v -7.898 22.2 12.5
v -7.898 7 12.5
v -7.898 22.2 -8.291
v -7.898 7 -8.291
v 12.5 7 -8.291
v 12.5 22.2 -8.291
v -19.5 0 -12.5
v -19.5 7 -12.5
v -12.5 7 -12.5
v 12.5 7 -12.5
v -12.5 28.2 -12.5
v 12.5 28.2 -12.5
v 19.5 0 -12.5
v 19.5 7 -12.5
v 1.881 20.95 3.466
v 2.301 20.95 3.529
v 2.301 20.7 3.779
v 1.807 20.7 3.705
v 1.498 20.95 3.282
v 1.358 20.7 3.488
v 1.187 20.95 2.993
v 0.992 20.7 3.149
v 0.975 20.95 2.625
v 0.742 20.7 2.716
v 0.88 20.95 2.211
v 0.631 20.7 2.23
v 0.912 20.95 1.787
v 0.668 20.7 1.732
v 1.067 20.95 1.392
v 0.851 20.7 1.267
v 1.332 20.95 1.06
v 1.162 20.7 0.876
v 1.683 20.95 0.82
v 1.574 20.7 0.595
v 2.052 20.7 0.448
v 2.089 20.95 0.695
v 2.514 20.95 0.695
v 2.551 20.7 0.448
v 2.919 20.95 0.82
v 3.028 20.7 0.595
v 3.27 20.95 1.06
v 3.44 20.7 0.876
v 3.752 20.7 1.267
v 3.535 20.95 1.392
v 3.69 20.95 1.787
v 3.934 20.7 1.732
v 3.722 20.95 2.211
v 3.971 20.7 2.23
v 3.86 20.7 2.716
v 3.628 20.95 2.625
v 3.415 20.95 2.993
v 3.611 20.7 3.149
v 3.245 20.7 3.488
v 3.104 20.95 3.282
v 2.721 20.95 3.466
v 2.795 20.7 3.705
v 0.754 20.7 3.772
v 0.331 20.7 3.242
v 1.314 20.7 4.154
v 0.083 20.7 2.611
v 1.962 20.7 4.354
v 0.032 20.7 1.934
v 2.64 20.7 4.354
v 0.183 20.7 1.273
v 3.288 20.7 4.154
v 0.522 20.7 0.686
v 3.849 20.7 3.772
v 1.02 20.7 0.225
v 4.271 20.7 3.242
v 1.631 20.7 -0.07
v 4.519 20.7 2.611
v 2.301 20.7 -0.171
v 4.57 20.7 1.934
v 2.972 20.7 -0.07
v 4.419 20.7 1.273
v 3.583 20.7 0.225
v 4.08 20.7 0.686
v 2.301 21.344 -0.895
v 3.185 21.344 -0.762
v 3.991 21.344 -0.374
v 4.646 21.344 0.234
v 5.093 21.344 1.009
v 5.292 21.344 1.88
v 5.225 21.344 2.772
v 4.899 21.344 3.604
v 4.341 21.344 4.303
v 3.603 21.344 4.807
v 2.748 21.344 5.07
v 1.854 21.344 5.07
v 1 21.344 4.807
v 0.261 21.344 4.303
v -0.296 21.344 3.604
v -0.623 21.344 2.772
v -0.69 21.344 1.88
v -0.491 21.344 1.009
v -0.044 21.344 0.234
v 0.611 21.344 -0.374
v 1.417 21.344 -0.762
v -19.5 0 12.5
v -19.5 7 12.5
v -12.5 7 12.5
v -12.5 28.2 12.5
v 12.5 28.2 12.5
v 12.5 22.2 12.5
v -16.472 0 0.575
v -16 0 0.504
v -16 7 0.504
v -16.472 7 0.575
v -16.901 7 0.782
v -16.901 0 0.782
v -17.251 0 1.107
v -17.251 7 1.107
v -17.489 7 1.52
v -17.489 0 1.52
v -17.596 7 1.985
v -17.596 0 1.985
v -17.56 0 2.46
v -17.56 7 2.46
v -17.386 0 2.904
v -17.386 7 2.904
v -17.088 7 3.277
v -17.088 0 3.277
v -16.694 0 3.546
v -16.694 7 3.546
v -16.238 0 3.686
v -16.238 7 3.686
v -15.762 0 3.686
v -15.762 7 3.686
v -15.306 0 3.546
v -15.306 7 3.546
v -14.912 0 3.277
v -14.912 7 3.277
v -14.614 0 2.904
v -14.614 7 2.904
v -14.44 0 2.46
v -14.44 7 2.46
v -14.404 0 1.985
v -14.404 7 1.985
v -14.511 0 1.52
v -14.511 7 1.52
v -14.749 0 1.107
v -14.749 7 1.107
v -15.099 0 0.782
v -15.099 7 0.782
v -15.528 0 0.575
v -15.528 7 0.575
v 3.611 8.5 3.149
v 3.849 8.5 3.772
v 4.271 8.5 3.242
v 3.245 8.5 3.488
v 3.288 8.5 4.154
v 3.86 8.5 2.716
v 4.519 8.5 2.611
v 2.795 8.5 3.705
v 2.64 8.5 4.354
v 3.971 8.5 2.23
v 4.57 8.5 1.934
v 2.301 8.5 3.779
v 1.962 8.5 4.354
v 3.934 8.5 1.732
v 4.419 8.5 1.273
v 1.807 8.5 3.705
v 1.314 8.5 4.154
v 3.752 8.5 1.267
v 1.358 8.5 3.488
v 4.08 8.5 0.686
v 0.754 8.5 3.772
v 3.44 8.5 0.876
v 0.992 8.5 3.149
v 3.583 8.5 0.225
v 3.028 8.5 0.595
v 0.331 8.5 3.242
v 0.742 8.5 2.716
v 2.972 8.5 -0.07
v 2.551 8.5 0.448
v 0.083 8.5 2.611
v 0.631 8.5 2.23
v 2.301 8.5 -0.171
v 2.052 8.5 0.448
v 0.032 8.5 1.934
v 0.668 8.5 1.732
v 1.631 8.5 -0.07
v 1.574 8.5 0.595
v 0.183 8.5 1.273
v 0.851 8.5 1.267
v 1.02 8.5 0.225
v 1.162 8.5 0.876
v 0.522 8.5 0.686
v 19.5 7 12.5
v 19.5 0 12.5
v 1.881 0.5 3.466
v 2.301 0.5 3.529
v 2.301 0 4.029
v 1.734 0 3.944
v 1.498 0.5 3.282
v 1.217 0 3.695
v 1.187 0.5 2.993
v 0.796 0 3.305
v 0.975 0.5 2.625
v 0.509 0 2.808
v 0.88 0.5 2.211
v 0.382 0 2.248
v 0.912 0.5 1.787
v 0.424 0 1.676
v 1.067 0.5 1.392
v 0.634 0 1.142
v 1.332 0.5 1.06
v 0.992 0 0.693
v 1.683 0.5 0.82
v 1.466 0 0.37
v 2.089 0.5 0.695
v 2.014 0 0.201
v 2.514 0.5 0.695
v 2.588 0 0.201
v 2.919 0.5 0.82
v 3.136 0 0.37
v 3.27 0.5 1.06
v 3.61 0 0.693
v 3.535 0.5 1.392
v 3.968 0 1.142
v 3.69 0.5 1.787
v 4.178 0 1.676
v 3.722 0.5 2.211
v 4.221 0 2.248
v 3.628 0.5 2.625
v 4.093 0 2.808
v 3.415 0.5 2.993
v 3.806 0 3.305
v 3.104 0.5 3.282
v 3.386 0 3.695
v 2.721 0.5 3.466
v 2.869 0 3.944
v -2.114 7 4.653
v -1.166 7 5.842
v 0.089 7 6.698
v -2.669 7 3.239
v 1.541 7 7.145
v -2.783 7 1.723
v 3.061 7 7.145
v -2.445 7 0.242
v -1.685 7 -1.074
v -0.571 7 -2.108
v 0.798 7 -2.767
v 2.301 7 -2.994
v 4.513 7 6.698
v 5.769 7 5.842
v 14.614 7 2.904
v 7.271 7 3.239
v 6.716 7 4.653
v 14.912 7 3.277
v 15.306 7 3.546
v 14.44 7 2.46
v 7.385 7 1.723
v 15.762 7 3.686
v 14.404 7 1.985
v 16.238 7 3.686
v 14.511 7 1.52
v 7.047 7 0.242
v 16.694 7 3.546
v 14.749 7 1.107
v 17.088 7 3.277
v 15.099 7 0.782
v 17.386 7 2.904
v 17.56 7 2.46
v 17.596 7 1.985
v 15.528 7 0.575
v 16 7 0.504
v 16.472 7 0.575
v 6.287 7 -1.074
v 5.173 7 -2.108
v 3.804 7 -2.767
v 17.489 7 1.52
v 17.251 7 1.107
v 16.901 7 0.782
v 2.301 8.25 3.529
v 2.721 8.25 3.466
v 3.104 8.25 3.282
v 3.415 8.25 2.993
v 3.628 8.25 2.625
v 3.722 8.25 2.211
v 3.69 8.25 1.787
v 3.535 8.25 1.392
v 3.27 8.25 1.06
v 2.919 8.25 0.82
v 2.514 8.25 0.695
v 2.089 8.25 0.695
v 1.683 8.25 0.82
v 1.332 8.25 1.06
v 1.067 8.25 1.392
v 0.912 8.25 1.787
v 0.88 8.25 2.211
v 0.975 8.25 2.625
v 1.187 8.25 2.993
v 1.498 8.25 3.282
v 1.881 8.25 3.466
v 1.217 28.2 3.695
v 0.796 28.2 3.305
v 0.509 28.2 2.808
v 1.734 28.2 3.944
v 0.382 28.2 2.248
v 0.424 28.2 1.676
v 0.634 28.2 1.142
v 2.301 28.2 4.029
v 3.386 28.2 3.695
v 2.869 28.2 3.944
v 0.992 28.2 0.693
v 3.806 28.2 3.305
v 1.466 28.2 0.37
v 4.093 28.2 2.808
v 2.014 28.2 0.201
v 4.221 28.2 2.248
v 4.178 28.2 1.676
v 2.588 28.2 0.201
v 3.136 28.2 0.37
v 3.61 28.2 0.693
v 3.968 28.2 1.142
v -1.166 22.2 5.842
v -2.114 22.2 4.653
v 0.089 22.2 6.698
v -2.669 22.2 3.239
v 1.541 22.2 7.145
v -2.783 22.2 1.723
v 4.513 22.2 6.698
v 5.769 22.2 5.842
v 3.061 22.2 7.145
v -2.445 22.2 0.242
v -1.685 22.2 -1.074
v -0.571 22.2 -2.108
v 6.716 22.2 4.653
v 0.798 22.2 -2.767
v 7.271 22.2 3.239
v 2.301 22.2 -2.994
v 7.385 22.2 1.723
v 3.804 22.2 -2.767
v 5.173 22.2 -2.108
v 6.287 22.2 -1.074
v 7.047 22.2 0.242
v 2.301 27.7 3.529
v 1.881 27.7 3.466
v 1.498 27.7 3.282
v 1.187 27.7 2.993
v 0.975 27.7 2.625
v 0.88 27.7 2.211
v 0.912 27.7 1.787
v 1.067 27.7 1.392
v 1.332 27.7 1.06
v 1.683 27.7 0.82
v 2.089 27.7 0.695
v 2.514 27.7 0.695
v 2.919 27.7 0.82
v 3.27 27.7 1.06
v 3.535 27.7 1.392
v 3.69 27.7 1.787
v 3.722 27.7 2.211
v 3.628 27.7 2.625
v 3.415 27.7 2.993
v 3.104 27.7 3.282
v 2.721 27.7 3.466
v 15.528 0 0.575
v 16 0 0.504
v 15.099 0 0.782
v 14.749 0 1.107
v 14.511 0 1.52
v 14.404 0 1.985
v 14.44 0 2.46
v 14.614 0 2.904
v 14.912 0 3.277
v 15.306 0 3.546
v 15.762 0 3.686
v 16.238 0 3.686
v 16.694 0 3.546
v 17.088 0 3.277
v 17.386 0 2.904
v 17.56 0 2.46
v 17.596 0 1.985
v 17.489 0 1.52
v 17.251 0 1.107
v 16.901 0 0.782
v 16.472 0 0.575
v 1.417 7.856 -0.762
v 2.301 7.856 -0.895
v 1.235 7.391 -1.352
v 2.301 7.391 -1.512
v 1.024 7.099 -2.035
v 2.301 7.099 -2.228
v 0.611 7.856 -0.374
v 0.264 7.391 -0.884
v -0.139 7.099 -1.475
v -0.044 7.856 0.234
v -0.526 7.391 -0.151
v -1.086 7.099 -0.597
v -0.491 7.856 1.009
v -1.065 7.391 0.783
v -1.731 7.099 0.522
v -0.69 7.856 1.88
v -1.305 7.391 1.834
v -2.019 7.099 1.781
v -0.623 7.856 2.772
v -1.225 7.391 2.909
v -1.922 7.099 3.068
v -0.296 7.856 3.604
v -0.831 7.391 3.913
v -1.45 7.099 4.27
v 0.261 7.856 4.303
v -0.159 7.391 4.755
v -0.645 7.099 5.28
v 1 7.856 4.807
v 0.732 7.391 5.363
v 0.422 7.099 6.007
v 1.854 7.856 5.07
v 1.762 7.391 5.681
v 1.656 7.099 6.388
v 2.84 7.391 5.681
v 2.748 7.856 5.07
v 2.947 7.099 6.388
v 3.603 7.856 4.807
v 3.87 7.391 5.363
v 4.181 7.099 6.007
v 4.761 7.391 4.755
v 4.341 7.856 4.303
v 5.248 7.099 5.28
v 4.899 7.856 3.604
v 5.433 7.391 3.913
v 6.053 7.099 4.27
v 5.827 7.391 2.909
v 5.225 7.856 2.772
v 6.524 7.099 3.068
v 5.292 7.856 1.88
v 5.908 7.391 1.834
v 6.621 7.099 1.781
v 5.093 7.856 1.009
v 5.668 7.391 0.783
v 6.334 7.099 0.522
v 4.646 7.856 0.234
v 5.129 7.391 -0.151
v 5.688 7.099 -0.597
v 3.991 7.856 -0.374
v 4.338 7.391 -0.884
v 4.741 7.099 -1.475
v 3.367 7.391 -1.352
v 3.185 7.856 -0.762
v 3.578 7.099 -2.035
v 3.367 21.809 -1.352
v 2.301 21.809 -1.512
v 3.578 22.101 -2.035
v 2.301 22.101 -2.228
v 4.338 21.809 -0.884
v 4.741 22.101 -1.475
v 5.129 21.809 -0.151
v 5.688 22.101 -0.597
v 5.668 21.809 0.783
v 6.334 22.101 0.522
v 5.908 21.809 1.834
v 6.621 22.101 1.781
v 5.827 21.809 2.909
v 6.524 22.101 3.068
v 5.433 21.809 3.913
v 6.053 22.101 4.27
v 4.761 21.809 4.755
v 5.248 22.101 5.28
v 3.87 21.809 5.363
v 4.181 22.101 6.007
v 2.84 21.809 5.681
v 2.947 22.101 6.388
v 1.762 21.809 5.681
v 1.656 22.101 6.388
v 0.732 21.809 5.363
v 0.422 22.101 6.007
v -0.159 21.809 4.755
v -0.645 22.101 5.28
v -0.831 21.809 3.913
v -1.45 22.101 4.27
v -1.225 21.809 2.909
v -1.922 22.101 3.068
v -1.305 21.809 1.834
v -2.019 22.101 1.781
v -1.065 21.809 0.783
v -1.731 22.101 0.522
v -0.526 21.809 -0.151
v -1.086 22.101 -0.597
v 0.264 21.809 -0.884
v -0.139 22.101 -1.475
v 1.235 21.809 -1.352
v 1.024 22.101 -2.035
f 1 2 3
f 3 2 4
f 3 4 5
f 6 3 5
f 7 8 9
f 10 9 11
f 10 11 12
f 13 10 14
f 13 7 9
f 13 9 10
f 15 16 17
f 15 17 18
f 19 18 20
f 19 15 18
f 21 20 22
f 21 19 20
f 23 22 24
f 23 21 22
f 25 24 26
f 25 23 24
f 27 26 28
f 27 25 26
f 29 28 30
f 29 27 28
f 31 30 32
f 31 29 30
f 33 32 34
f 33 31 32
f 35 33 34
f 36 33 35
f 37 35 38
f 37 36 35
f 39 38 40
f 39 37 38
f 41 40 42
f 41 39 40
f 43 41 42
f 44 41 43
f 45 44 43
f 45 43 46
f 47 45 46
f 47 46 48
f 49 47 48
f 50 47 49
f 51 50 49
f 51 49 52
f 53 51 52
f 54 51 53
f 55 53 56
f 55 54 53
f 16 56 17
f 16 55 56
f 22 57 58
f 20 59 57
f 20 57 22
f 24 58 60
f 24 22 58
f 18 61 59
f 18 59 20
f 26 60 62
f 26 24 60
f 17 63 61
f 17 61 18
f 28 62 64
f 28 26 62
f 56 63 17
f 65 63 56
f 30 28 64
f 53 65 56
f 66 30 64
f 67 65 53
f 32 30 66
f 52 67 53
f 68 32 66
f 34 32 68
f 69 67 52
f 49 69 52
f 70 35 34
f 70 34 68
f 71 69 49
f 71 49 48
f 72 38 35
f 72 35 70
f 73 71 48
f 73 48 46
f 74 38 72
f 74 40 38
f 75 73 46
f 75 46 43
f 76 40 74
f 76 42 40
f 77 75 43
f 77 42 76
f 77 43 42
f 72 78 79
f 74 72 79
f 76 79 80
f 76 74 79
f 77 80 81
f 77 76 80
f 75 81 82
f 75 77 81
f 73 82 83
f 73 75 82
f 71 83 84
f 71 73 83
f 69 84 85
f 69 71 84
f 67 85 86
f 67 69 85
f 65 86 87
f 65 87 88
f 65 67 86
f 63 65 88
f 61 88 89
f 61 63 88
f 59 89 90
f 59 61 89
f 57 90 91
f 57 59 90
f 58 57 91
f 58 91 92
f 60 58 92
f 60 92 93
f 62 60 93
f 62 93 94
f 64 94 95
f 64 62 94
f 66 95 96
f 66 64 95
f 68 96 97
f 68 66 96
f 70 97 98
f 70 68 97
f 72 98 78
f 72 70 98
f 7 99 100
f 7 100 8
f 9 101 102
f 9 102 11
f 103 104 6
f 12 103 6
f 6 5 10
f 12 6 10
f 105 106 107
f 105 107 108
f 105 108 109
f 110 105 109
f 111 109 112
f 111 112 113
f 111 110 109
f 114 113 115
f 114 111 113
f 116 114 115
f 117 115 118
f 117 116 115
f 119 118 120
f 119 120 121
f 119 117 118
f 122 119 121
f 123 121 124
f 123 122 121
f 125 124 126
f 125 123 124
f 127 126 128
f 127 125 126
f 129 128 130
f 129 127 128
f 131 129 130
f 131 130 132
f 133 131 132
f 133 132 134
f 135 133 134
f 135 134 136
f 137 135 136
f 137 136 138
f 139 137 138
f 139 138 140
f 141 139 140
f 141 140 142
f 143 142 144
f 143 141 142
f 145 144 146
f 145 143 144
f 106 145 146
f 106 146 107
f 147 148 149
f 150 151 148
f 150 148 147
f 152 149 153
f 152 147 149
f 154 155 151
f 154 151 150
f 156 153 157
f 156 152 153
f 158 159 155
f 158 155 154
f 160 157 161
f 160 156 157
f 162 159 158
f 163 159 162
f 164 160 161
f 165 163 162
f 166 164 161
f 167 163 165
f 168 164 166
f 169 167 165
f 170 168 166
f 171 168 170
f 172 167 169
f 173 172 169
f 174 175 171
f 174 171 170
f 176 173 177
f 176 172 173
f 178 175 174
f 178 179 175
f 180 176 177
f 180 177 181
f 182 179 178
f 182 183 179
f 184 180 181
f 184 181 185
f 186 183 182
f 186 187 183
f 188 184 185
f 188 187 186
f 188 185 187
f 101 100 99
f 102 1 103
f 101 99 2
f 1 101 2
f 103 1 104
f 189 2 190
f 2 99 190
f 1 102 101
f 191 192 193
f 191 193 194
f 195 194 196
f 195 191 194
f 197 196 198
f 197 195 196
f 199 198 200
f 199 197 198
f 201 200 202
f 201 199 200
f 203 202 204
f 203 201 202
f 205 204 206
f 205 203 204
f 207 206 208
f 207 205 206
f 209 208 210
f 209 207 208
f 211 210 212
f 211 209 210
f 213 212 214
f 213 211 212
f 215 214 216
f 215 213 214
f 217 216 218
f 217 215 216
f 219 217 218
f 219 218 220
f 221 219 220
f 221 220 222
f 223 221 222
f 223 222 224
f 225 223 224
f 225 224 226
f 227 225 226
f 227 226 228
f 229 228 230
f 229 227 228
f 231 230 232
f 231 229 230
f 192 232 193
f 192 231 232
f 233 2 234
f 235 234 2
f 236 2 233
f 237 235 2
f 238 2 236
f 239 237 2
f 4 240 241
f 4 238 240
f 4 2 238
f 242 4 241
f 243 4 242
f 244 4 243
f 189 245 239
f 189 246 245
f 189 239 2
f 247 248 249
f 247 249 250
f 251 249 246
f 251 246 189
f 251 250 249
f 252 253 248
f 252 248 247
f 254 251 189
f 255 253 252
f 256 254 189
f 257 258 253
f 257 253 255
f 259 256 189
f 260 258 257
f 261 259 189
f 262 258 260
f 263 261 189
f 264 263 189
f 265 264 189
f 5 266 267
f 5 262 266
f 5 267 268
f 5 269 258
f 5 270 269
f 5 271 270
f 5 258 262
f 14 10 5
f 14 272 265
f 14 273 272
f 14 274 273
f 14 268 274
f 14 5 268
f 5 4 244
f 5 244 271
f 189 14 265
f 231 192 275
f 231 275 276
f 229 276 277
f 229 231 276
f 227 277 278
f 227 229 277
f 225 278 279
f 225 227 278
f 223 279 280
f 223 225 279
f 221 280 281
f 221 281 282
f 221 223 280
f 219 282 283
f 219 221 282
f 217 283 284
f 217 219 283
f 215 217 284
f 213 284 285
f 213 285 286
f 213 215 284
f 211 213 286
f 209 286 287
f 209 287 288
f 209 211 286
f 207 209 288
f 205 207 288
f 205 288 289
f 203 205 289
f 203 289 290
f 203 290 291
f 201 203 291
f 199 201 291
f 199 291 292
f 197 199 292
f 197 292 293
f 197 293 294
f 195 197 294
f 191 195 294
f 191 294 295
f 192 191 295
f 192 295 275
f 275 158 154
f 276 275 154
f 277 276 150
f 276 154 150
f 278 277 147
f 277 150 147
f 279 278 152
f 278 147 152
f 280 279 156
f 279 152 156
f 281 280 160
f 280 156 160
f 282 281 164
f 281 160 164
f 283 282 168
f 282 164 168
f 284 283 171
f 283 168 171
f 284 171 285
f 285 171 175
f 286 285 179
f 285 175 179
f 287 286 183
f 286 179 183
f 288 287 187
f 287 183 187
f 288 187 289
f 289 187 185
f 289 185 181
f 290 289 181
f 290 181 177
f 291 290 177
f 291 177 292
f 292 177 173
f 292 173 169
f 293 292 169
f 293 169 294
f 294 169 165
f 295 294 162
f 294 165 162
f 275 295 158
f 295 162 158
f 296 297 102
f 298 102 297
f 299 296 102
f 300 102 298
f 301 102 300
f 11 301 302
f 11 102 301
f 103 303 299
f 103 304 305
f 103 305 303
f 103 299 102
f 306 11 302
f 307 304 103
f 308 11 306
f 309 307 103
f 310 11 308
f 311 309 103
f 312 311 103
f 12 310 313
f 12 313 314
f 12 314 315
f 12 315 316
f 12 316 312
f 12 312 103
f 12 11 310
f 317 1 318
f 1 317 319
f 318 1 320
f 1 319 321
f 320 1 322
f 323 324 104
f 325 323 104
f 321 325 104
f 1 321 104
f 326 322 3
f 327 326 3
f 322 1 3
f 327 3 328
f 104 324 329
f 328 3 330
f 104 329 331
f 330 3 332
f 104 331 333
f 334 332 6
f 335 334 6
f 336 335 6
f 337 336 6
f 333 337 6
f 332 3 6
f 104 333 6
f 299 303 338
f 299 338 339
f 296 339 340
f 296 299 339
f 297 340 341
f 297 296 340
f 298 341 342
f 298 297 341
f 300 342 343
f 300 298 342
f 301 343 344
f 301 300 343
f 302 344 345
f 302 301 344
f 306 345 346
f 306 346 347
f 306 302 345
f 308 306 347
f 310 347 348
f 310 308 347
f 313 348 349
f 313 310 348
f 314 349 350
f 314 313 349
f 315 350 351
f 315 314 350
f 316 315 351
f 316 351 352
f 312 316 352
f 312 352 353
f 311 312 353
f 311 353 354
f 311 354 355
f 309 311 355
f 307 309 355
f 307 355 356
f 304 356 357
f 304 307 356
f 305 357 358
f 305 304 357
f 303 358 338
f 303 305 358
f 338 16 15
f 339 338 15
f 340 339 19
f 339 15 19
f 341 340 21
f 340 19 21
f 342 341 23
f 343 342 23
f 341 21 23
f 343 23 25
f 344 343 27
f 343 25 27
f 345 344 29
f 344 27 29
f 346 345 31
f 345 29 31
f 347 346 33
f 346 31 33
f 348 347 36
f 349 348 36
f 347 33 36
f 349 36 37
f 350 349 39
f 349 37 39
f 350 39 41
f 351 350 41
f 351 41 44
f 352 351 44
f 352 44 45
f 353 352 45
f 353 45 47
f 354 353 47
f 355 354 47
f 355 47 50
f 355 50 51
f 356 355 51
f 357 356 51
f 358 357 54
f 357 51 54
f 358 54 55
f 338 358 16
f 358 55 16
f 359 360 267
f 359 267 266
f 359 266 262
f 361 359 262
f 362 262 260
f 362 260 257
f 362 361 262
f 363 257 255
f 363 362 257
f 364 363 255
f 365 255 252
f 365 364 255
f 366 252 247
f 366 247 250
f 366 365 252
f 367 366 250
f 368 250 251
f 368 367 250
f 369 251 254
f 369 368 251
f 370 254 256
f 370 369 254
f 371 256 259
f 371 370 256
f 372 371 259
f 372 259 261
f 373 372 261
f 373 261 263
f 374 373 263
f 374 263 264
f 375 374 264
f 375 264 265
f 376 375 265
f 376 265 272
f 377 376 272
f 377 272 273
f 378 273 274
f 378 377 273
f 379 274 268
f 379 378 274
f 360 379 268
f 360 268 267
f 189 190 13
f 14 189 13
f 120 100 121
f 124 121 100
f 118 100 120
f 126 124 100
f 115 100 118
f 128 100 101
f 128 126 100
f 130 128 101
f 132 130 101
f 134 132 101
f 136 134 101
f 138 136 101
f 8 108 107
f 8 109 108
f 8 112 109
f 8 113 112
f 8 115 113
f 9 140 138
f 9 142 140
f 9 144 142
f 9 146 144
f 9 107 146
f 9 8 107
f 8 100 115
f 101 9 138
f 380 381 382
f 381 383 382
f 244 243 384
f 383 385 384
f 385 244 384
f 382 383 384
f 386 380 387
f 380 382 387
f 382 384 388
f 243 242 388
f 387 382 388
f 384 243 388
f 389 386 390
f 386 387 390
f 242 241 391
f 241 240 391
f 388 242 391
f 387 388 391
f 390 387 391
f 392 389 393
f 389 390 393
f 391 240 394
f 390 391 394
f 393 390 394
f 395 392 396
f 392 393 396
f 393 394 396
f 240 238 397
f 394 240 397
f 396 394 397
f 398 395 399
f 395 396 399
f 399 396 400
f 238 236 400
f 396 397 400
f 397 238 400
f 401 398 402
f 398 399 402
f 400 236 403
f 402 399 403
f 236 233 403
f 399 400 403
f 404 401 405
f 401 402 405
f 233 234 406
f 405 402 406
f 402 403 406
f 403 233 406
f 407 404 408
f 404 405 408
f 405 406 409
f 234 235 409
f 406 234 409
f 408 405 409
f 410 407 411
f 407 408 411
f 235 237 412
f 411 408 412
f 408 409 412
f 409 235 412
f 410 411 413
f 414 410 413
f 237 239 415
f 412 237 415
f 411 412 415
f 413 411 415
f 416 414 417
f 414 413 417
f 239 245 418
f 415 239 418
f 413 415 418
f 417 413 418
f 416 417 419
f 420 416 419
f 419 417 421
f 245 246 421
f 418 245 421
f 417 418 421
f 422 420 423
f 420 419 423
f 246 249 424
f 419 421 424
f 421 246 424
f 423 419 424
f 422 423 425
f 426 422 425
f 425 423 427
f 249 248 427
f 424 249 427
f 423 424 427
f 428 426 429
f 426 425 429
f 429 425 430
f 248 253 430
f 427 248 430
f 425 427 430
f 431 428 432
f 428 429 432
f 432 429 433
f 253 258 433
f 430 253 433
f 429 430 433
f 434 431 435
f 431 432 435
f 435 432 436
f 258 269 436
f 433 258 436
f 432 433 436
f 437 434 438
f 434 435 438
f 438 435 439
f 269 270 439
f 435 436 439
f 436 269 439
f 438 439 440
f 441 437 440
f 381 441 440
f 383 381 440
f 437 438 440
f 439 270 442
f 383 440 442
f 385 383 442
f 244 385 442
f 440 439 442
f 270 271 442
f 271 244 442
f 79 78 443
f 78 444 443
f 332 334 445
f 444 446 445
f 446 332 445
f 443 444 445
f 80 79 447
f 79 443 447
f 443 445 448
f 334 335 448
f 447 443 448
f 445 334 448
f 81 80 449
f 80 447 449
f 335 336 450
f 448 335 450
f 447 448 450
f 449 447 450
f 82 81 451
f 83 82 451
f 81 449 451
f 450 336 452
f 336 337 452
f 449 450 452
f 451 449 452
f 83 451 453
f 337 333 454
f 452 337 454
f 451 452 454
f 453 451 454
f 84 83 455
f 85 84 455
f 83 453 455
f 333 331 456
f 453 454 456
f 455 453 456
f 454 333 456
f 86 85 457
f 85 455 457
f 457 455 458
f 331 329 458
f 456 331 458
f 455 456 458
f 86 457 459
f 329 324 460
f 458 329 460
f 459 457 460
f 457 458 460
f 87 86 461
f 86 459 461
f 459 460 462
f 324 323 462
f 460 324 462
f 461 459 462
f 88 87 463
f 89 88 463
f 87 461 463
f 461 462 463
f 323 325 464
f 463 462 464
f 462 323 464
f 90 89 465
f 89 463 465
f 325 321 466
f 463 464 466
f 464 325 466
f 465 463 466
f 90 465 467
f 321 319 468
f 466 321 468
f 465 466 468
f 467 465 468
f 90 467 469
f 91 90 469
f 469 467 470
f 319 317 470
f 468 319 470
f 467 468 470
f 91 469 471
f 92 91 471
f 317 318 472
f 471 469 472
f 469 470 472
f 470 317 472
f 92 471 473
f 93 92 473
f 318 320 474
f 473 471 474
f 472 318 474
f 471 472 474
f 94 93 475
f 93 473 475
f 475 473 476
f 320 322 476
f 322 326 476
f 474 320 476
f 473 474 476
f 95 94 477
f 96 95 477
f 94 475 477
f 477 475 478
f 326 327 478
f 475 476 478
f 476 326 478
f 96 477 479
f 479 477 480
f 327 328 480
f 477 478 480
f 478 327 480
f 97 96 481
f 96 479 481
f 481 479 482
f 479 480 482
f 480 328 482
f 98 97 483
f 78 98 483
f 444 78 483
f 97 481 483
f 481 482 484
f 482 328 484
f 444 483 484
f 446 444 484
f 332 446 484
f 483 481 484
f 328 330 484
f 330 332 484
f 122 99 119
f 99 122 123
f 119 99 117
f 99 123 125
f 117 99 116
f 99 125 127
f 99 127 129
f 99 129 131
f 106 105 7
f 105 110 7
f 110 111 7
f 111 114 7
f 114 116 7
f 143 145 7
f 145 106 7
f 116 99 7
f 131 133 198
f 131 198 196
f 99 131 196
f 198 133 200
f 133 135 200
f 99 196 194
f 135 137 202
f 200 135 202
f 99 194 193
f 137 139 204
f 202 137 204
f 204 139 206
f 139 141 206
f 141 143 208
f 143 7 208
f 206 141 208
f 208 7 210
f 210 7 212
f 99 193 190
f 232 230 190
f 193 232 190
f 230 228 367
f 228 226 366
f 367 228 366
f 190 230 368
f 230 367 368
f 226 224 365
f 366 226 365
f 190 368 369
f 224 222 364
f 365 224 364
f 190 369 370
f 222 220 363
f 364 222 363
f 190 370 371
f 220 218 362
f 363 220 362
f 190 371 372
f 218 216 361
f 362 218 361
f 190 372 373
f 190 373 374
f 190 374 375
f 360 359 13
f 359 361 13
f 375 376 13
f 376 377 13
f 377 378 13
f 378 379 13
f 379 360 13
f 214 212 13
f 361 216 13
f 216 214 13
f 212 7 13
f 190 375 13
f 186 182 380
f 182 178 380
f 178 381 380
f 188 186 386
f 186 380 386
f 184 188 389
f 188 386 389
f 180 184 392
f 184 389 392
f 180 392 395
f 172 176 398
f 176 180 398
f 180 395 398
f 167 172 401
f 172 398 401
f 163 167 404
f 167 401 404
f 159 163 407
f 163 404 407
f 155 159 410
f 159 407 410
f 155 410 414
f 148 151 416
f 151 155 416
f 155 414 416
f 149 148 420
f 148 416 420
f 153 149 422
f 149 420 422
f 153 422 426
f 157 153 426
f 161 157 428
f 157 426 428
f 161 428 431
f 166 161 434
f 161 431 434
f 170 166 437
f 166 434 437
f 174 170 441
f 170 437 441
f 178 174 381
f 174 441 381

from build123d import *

# Parameters (mm, degrees)
SKETCH1_W               = 25
SKETCH1_H               = 25
BOSS_EXTRUDE1_DEPTH     = 7
BOSS_EXTRUDE2_DEPTH     = 15.2
SKETCH3_W               = 25
SKETCH3_H               = 25
BOSS_EXTRUDE3_DEPTH     = 6
CUT_EXTRUDE1_DEPTH      = 28.603260677
CUT_EXTRUDE1_DEPTH_BACK = 28.603260677
SKETCH4_R               = 1.425
SKETCH5_R               = 2.5
SKETCH5_R_2             = 1.425
BOSS_EXTRUDE4_DEPTH     = 1.5
BOSS_EXTRUDE5_START     = 1.5
SKETCH6_R               = 2.5
SKETCH6_R_2             = 1.425
BOSS_EXTRUDE5_DEPTH     = 1.5
FILLET1_R               = 3
CHAMFER2_SIZE           = 0.25
CHAMFER3_SIZE           = 0.5
SKETCH8_W               = 7
SKETCH8_H               = 25
SKETCH8_R               = 1.6
BOSS_EXTRUDE6_DEPTH     = 7


with BuildPart() as part:
    # Sketch1 → Boss-Extrude1 (new body)
    with BuildSketch(Plane(origin=(0, 0, 0), x_dir=(1, 0, 0), z_dir=(0, 1, 0))):
        Rectangle(SKETCH1_W, SKETCH1_H)
    extrude(amount=BOSS_EXTRUDE1_DEPTH)

    # Sketch2 → Boss-Extrude2 (add)
    with BuildSketch(Plane(origin=(0, 7, 0), x_dir=(1, 0, 0), z_dir=(0, 1, 0))):
        Polygon((-12.5, -12.5), (-7.897681384, -12.5), (-7.897681384, 8.291292288), (12.5, 8.291292288), (12.5, 12.5), (-12.5, 12.5), align=None)
    extrude(amount=BOSS_EXTRUDE2_DEPTH)

    # Sketch3 → Boss-Extrude3 (add)
    with BuildSketch(Plane(origin=(0, 22.2, 0), x_dir=(1, 0, 0), z_dir=(0, 1, 0))):
        Rectangle(SKETCH3_W, SKETCH3_H)
    extrude(amount=BOSS_EXTRUDE3_DEPTH)

    # Sketch4 → Cut-Extrude1 (cut, two sides: drawn at the far end of the back side and taken through both)
    with BuildSketch(Plane(origin=(0, 7, 0), x_dir=(1, 0, 0), z_dir=(0, 1, 0)).offset(-CUT_EXTRUDE1_DEPTH_BACK)):
        with Locations(Location((2.301159308, -2.104353856, 0), (0, 0, 270))):
            Circle(SKETCH4_R)
    extrude(amount=CUT_EXTRUDE1_DEPTH + CUT_EXTRUDE1_DEPTH_BACK, mode=Mode.SUBTRACT)

    # Sketch5 → Boss-Extrude4 (add)
    with BuildSketch(Plane(origin=(0, 7, 0), x_dir=(1, 0, 0), z_dir=(0, 1, 0))):
        with Locations(Location((2.301159308, -2.104353856, 0), (0, 0, 90))):
            Circle(SKETCH5_R)
        with Locations(Location((2.301159308, -2.104353856, 0), (0, 0, 270))):
            Circle(SKETCH5_R_2, mode=Mode.SUBTRACT)
    extrude(amount=BOSS_EXTRUDE4_DEPTH)

    # Sketch6 → Boss-Extrude5 (add)
    with BuildSketch(Plane.XZ.offset(-22.2).offset(BOSS_EXTRUDE5_START)):
        with Locations(Location((2.301159308, 2.104353856, 0), (0, 0, 270))):
            Circle(SKETCH6_R)
        with Locations(Location((2.301159308, 2.104353856, 0), (0, 0, 90))):
            Circle(SKETCH6_R_2, mode=Mode.SUBTRACT)
    extrude(amount=-BOSS_EXTRUDE5_DEPTH)

    # Fillet1
    # the kernel refuses this fillet: 3 mm, written as the material it adds along each edge
    with BuildSketch(Plane(origin=(2.301159308, 7, 2.104353856), x_dir=(0, 0, -1), z_dir=(1, 0, 0))) as fillet1_piece_1:
        with BuildLine():
            CenterArc((5.098076211, 3), FILLET1_R, 210, 60)
            Line((2.5, 1.5), (2.448038476, 1.47))
            ThreePointArc((2.448038476, 1.47), (2.44, 0.75), (2.44, 0))
            Line((2.44, 0), (2.5, -0.06))
            Line((2.5, -0.06), (5.098076211, -0.06))
            Line((5.098076211, -0.06), (5.098076211, 0))
        make_face()
    revolve(axis=Axis((2.301159308, 7, 2.104353856), (0, 1, 0)))
    with BuildSketch(Plane(origin=(2.301159308, 22.2, 2.104353856), x_dir=(0, 0, -1), z_dir=(-1, 0, 0))) as fillet1_piece_2:
        with BuildLine():
            CenterArc((5.098076211, 3), FILLET1_R, 210, 60)
            Line((2.5, 1.5), (2.448038476, 1.47))
            ThreePointArc((2.448038476, 1.47), (2.44, 0.75), (2.44, 0))
            Line((2.44, 0), (2.5, -0.06))
            Line((2.5, -0.06), (5.098076211, -0.06))
            Line((5.098076211, -0.06), (5.098076211, 0))
        make_face()
    revolve(axis=Axis((2.301159308, 22.2, 2.104353856), (0, -1, 0)))

    # Chamfer1
    # the kernel refuses this chamfer: 1, 0.396795558 mm, written as the material it takes off along each edge
    with BuildSketch(Plane(origin=(2.301159308, 8.5, 2.104353856), x_dir=(0, 0, -1), z_dir=(1, 0, 0))) as chamfer1_piece_1:
        with BuildLine():
            Line((2.245190561, 0.026572252), (3.029375179, -0.670372697))
            Line((3.029375179, -0.670372697), (3.043365842, -0.656080694))
            ThreePointArc((3.043365842, -0.656080694), (2.755730305, -0.342231162), (2.517320508, 0.01))
            Line((2.517320508, 0.01), (2.5, 0.02))
            ThreePointArc((2.5, 0.02), (2.37259528, 0.02), (2.245190561, 0.046572252))
            Line((2.245190561, 0.046572252), (2.245190561, 0.026572252))
        make_face()
    revolve(axis=Axis((2.301159308, 8.5, 2.104353856), (0, 1, 0)), mode=Mode.SUBTRACT)
    with BuildSketch(Plane(origin=(2.301159308, 20.7, 2.104353856), x_dir=(0, 0, -1), z_dir=(-1, 0, 0))) as chamfer1_piece_2:
        with BuildLine():
            Line((3.029375179, -0.670372697), (2.245190561, 0.026572252))
            Line((2.245190561, 0.026572252), (2.245190561, 0.046572252))
            ThreePointArc((2.245190561, 0.046572252), (2.37259528, 0.02), (2.5, 0.02))
            Line((2.5, 0.02), (2.517320508, 0.01))
            ThreePointArc((2.517320508, 0.01), (2.755730305, -0.342231162), (3.043365842, -0.656080694))
            Line((3.043365842, -0.656080694), (3.029375179, -0.670372697))
        make_face()
    revolve(axis=Axis((2.301159308, 20.7, 2.104353856), (0, -1, 0)), mode=Mode.SUBTRACT)

    # Chamfer2
    chamfer2_edges = [part.edges().sort_by_distance(p)[0] for p in [
        (2.301159308, 8.5, 0.679353856),
        (2.301159308, 20.7, 0.679353856),
    ]]
    chamfer(chamfer2_edges, length=CHAMFER2_SIZE)

    # Chamfer3
    chamfer3_edges = [part.edges().sort_by_distance(p)[0] for p in [
        (2.301159308, 0, 0.679353856),
        (2.301159308, 28.2, 0.679353856),
    ]]
    chamfer(chamfer3_edges, length=CHAMFER3_SIZE)

    # Sketch8 → Boss-Extrude6 (add)
    # profile 1 of 2: a face of its own
    with BuildSketch(Plane(origin=(0, 0, 0), x_dir=(1, 0, 0), z_dir=(0, 1, 0))):
        with Locations((16, 0)):
            Rectangle(SKETCH8_W, SKETCH8_H)
        with Locations(Location((16, -2.104353856, 0), (0, 0, 90))):
            Circle(SKETCH8_R, mode=Mode.SUBTRACT)
    # profile 2 of 2: a face of its own
    with BuildSketch(Plane(origin=(0, 0, 0), x_dir=(1, 0, 0), z_dir=(0, 1, 0))):
        with Locations((-16, 0)):
            Rectangle(SKETCH8_W, SKETCH8_H)
        with Locations(Location((-16, -2.104353856, 0), (0, 0, 90))):
            Circle(SKETCH8_R, mode=Mode.SUBTRACT)
    extrude(amount=BOSS_EXTRUDE6_DEPTH)


solid = part.part
